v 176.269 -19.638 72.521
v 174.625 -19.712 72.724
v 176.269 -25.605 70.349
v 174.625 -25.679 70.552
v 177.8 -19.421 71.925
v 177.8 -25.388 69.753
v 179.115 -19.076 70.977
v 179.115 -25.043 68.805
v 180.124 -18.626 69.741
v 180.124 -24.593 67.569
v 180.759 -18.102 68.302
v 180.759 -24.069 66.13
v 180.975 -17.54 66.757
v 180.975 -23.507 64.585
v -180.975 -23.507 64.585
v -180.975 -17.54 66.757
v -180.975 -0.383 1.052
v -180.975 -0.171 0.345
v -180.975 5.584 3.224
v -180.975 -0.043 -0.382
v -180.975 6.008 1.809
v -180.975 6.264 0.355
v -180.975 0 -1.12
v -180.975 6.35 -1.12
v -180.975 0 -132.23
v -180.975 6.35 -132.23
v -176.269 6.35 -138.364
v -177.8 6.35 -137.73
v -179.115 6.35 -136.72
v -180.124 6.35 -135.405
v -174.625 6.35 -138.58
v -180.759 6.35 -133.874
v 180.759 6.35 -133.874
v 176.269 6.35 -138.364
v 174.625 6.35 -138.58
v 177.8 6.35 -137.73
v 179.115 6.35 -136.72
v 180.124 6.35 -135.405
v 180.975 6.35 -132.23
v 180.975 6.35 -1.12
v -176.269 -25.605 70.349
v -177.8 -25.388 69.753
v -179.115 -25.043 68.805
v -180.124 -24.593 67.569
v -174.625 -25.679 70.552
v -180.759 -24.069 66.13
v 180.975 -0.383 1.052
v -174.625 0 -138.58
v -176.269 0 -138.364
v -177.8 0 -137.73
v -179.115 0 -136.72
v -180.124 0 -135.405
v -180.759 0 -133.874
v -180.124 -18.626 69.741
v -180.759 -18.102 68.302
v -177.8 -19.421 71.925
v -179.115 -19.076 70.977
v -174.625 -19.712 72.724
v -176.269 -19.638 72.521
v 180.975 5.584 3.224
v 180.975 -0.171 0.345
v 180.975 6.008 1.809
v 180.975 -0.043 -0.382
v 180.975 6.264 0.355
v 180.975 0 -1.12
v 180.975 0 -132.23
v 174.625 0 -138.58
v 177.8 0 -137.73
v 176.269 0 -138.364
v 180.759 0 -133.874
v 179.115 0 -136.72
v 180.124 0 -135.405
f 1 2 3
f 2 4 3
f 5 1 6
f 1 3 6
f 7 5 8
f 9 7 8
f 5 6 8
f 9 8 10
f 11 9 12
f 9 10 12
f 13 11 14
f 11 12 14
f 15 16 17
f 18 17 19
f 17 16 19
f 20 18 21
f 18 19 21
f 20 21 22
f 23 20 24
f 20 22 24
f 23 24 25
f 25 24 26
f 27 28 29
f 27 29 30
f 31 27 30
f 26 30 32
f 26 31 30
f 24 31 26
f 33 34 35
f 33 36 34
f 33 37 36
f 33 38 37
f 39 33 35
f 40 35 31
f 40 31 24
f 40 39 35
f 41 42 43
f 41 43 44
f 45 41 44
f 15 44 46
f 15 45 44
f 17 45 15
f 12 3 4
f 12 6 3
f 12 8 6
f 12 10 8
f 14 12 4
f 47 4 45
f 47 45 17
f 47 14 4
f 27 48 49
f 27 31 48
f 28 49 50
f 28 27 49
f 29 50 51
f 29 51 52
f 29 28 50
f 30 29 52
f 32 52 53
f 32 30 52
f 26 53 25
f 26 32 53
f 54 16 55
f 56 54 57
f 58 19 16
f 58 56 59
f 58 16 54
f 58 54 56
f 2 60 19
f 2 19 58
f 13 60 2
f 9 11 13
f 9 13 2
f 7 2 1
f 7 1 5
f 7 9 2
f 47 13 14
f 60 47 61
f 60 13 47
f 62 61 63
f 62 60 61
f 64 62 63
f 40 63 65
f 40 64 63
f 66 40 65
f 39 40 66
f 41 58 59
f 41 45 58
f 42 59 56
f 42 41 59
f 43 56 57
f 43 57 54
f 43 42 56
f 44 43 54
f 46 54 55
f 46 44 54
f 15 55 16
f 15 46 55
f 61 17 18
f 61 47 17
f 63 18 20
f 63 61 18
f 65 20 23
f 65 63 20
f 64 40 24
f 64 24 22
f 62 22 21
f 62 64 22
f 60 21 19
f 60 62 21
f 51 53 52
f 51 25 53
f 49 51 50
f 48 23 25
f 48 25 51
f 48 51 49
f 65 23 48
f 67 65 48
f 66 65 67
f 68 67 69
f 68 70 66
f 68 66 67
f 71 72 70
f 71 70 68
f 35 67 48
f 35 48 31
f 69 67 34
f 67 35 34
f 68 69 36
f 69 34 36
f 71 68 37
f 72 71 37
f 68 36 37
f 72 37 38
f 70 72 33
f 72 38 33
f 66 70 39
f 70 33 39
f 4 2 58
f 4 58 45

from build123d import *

# Parameters (mm, degrees)
BOSS_EXTRUDE1_DEPTH = 180.975
FILLET1_R           = 6.35


with BuildPart() as part:
    # Sketch1 → Boss-Extrude1 (new body, symmetric)
    with BuildSketch(Plane(origin=(0, 0, 0), x_dir=(0, 0, -1), z_dir=(1, 0, 0))):
        with BuildLine():
            ThreePointArc((-1.052151583, -0.382951858), (0.017010399, -0.096470768), (1.119676327, 0))
            Line((1.119676327, 0), (138.580323673, 0))
            Line((138.580323673, 0), (138.580323673, 6.35))
            Line((138.580323673, 6.35), (1.119676327, 6.35))
            ThreePointArc((1.119676327, 6.35), (-1.085655529, 6.157058463), (-3.223979493, 5.584096284))
            Line((-3.223979493, 5.584096284), (-72.724254031, -19.711934921))
            Line((-72.724254031, -19.711934921), (-70.552426121, -25.678983063))
            Line((-70.552426121, -25.678983063), (-1.052151583, -0.382951858))
        make_face()
    extrude(amount=BOSS_EXTRUDE1_DEPTH, both=True)

    # Fillet1
    fillet1_edges = [part.edges().sort_by_distance(p)[0] for p in [
        (-180.975, -22.695458992, 71.638340076),
        (180.975, -22.695458992, 71.638340076),
        (180.975, 3.175, -138.580323673),
        (-180.975, 3.175, -138.580323673),
    ]]
    fillet(fillet1_edges, radius=FILLET1_R)


solid = part.part
